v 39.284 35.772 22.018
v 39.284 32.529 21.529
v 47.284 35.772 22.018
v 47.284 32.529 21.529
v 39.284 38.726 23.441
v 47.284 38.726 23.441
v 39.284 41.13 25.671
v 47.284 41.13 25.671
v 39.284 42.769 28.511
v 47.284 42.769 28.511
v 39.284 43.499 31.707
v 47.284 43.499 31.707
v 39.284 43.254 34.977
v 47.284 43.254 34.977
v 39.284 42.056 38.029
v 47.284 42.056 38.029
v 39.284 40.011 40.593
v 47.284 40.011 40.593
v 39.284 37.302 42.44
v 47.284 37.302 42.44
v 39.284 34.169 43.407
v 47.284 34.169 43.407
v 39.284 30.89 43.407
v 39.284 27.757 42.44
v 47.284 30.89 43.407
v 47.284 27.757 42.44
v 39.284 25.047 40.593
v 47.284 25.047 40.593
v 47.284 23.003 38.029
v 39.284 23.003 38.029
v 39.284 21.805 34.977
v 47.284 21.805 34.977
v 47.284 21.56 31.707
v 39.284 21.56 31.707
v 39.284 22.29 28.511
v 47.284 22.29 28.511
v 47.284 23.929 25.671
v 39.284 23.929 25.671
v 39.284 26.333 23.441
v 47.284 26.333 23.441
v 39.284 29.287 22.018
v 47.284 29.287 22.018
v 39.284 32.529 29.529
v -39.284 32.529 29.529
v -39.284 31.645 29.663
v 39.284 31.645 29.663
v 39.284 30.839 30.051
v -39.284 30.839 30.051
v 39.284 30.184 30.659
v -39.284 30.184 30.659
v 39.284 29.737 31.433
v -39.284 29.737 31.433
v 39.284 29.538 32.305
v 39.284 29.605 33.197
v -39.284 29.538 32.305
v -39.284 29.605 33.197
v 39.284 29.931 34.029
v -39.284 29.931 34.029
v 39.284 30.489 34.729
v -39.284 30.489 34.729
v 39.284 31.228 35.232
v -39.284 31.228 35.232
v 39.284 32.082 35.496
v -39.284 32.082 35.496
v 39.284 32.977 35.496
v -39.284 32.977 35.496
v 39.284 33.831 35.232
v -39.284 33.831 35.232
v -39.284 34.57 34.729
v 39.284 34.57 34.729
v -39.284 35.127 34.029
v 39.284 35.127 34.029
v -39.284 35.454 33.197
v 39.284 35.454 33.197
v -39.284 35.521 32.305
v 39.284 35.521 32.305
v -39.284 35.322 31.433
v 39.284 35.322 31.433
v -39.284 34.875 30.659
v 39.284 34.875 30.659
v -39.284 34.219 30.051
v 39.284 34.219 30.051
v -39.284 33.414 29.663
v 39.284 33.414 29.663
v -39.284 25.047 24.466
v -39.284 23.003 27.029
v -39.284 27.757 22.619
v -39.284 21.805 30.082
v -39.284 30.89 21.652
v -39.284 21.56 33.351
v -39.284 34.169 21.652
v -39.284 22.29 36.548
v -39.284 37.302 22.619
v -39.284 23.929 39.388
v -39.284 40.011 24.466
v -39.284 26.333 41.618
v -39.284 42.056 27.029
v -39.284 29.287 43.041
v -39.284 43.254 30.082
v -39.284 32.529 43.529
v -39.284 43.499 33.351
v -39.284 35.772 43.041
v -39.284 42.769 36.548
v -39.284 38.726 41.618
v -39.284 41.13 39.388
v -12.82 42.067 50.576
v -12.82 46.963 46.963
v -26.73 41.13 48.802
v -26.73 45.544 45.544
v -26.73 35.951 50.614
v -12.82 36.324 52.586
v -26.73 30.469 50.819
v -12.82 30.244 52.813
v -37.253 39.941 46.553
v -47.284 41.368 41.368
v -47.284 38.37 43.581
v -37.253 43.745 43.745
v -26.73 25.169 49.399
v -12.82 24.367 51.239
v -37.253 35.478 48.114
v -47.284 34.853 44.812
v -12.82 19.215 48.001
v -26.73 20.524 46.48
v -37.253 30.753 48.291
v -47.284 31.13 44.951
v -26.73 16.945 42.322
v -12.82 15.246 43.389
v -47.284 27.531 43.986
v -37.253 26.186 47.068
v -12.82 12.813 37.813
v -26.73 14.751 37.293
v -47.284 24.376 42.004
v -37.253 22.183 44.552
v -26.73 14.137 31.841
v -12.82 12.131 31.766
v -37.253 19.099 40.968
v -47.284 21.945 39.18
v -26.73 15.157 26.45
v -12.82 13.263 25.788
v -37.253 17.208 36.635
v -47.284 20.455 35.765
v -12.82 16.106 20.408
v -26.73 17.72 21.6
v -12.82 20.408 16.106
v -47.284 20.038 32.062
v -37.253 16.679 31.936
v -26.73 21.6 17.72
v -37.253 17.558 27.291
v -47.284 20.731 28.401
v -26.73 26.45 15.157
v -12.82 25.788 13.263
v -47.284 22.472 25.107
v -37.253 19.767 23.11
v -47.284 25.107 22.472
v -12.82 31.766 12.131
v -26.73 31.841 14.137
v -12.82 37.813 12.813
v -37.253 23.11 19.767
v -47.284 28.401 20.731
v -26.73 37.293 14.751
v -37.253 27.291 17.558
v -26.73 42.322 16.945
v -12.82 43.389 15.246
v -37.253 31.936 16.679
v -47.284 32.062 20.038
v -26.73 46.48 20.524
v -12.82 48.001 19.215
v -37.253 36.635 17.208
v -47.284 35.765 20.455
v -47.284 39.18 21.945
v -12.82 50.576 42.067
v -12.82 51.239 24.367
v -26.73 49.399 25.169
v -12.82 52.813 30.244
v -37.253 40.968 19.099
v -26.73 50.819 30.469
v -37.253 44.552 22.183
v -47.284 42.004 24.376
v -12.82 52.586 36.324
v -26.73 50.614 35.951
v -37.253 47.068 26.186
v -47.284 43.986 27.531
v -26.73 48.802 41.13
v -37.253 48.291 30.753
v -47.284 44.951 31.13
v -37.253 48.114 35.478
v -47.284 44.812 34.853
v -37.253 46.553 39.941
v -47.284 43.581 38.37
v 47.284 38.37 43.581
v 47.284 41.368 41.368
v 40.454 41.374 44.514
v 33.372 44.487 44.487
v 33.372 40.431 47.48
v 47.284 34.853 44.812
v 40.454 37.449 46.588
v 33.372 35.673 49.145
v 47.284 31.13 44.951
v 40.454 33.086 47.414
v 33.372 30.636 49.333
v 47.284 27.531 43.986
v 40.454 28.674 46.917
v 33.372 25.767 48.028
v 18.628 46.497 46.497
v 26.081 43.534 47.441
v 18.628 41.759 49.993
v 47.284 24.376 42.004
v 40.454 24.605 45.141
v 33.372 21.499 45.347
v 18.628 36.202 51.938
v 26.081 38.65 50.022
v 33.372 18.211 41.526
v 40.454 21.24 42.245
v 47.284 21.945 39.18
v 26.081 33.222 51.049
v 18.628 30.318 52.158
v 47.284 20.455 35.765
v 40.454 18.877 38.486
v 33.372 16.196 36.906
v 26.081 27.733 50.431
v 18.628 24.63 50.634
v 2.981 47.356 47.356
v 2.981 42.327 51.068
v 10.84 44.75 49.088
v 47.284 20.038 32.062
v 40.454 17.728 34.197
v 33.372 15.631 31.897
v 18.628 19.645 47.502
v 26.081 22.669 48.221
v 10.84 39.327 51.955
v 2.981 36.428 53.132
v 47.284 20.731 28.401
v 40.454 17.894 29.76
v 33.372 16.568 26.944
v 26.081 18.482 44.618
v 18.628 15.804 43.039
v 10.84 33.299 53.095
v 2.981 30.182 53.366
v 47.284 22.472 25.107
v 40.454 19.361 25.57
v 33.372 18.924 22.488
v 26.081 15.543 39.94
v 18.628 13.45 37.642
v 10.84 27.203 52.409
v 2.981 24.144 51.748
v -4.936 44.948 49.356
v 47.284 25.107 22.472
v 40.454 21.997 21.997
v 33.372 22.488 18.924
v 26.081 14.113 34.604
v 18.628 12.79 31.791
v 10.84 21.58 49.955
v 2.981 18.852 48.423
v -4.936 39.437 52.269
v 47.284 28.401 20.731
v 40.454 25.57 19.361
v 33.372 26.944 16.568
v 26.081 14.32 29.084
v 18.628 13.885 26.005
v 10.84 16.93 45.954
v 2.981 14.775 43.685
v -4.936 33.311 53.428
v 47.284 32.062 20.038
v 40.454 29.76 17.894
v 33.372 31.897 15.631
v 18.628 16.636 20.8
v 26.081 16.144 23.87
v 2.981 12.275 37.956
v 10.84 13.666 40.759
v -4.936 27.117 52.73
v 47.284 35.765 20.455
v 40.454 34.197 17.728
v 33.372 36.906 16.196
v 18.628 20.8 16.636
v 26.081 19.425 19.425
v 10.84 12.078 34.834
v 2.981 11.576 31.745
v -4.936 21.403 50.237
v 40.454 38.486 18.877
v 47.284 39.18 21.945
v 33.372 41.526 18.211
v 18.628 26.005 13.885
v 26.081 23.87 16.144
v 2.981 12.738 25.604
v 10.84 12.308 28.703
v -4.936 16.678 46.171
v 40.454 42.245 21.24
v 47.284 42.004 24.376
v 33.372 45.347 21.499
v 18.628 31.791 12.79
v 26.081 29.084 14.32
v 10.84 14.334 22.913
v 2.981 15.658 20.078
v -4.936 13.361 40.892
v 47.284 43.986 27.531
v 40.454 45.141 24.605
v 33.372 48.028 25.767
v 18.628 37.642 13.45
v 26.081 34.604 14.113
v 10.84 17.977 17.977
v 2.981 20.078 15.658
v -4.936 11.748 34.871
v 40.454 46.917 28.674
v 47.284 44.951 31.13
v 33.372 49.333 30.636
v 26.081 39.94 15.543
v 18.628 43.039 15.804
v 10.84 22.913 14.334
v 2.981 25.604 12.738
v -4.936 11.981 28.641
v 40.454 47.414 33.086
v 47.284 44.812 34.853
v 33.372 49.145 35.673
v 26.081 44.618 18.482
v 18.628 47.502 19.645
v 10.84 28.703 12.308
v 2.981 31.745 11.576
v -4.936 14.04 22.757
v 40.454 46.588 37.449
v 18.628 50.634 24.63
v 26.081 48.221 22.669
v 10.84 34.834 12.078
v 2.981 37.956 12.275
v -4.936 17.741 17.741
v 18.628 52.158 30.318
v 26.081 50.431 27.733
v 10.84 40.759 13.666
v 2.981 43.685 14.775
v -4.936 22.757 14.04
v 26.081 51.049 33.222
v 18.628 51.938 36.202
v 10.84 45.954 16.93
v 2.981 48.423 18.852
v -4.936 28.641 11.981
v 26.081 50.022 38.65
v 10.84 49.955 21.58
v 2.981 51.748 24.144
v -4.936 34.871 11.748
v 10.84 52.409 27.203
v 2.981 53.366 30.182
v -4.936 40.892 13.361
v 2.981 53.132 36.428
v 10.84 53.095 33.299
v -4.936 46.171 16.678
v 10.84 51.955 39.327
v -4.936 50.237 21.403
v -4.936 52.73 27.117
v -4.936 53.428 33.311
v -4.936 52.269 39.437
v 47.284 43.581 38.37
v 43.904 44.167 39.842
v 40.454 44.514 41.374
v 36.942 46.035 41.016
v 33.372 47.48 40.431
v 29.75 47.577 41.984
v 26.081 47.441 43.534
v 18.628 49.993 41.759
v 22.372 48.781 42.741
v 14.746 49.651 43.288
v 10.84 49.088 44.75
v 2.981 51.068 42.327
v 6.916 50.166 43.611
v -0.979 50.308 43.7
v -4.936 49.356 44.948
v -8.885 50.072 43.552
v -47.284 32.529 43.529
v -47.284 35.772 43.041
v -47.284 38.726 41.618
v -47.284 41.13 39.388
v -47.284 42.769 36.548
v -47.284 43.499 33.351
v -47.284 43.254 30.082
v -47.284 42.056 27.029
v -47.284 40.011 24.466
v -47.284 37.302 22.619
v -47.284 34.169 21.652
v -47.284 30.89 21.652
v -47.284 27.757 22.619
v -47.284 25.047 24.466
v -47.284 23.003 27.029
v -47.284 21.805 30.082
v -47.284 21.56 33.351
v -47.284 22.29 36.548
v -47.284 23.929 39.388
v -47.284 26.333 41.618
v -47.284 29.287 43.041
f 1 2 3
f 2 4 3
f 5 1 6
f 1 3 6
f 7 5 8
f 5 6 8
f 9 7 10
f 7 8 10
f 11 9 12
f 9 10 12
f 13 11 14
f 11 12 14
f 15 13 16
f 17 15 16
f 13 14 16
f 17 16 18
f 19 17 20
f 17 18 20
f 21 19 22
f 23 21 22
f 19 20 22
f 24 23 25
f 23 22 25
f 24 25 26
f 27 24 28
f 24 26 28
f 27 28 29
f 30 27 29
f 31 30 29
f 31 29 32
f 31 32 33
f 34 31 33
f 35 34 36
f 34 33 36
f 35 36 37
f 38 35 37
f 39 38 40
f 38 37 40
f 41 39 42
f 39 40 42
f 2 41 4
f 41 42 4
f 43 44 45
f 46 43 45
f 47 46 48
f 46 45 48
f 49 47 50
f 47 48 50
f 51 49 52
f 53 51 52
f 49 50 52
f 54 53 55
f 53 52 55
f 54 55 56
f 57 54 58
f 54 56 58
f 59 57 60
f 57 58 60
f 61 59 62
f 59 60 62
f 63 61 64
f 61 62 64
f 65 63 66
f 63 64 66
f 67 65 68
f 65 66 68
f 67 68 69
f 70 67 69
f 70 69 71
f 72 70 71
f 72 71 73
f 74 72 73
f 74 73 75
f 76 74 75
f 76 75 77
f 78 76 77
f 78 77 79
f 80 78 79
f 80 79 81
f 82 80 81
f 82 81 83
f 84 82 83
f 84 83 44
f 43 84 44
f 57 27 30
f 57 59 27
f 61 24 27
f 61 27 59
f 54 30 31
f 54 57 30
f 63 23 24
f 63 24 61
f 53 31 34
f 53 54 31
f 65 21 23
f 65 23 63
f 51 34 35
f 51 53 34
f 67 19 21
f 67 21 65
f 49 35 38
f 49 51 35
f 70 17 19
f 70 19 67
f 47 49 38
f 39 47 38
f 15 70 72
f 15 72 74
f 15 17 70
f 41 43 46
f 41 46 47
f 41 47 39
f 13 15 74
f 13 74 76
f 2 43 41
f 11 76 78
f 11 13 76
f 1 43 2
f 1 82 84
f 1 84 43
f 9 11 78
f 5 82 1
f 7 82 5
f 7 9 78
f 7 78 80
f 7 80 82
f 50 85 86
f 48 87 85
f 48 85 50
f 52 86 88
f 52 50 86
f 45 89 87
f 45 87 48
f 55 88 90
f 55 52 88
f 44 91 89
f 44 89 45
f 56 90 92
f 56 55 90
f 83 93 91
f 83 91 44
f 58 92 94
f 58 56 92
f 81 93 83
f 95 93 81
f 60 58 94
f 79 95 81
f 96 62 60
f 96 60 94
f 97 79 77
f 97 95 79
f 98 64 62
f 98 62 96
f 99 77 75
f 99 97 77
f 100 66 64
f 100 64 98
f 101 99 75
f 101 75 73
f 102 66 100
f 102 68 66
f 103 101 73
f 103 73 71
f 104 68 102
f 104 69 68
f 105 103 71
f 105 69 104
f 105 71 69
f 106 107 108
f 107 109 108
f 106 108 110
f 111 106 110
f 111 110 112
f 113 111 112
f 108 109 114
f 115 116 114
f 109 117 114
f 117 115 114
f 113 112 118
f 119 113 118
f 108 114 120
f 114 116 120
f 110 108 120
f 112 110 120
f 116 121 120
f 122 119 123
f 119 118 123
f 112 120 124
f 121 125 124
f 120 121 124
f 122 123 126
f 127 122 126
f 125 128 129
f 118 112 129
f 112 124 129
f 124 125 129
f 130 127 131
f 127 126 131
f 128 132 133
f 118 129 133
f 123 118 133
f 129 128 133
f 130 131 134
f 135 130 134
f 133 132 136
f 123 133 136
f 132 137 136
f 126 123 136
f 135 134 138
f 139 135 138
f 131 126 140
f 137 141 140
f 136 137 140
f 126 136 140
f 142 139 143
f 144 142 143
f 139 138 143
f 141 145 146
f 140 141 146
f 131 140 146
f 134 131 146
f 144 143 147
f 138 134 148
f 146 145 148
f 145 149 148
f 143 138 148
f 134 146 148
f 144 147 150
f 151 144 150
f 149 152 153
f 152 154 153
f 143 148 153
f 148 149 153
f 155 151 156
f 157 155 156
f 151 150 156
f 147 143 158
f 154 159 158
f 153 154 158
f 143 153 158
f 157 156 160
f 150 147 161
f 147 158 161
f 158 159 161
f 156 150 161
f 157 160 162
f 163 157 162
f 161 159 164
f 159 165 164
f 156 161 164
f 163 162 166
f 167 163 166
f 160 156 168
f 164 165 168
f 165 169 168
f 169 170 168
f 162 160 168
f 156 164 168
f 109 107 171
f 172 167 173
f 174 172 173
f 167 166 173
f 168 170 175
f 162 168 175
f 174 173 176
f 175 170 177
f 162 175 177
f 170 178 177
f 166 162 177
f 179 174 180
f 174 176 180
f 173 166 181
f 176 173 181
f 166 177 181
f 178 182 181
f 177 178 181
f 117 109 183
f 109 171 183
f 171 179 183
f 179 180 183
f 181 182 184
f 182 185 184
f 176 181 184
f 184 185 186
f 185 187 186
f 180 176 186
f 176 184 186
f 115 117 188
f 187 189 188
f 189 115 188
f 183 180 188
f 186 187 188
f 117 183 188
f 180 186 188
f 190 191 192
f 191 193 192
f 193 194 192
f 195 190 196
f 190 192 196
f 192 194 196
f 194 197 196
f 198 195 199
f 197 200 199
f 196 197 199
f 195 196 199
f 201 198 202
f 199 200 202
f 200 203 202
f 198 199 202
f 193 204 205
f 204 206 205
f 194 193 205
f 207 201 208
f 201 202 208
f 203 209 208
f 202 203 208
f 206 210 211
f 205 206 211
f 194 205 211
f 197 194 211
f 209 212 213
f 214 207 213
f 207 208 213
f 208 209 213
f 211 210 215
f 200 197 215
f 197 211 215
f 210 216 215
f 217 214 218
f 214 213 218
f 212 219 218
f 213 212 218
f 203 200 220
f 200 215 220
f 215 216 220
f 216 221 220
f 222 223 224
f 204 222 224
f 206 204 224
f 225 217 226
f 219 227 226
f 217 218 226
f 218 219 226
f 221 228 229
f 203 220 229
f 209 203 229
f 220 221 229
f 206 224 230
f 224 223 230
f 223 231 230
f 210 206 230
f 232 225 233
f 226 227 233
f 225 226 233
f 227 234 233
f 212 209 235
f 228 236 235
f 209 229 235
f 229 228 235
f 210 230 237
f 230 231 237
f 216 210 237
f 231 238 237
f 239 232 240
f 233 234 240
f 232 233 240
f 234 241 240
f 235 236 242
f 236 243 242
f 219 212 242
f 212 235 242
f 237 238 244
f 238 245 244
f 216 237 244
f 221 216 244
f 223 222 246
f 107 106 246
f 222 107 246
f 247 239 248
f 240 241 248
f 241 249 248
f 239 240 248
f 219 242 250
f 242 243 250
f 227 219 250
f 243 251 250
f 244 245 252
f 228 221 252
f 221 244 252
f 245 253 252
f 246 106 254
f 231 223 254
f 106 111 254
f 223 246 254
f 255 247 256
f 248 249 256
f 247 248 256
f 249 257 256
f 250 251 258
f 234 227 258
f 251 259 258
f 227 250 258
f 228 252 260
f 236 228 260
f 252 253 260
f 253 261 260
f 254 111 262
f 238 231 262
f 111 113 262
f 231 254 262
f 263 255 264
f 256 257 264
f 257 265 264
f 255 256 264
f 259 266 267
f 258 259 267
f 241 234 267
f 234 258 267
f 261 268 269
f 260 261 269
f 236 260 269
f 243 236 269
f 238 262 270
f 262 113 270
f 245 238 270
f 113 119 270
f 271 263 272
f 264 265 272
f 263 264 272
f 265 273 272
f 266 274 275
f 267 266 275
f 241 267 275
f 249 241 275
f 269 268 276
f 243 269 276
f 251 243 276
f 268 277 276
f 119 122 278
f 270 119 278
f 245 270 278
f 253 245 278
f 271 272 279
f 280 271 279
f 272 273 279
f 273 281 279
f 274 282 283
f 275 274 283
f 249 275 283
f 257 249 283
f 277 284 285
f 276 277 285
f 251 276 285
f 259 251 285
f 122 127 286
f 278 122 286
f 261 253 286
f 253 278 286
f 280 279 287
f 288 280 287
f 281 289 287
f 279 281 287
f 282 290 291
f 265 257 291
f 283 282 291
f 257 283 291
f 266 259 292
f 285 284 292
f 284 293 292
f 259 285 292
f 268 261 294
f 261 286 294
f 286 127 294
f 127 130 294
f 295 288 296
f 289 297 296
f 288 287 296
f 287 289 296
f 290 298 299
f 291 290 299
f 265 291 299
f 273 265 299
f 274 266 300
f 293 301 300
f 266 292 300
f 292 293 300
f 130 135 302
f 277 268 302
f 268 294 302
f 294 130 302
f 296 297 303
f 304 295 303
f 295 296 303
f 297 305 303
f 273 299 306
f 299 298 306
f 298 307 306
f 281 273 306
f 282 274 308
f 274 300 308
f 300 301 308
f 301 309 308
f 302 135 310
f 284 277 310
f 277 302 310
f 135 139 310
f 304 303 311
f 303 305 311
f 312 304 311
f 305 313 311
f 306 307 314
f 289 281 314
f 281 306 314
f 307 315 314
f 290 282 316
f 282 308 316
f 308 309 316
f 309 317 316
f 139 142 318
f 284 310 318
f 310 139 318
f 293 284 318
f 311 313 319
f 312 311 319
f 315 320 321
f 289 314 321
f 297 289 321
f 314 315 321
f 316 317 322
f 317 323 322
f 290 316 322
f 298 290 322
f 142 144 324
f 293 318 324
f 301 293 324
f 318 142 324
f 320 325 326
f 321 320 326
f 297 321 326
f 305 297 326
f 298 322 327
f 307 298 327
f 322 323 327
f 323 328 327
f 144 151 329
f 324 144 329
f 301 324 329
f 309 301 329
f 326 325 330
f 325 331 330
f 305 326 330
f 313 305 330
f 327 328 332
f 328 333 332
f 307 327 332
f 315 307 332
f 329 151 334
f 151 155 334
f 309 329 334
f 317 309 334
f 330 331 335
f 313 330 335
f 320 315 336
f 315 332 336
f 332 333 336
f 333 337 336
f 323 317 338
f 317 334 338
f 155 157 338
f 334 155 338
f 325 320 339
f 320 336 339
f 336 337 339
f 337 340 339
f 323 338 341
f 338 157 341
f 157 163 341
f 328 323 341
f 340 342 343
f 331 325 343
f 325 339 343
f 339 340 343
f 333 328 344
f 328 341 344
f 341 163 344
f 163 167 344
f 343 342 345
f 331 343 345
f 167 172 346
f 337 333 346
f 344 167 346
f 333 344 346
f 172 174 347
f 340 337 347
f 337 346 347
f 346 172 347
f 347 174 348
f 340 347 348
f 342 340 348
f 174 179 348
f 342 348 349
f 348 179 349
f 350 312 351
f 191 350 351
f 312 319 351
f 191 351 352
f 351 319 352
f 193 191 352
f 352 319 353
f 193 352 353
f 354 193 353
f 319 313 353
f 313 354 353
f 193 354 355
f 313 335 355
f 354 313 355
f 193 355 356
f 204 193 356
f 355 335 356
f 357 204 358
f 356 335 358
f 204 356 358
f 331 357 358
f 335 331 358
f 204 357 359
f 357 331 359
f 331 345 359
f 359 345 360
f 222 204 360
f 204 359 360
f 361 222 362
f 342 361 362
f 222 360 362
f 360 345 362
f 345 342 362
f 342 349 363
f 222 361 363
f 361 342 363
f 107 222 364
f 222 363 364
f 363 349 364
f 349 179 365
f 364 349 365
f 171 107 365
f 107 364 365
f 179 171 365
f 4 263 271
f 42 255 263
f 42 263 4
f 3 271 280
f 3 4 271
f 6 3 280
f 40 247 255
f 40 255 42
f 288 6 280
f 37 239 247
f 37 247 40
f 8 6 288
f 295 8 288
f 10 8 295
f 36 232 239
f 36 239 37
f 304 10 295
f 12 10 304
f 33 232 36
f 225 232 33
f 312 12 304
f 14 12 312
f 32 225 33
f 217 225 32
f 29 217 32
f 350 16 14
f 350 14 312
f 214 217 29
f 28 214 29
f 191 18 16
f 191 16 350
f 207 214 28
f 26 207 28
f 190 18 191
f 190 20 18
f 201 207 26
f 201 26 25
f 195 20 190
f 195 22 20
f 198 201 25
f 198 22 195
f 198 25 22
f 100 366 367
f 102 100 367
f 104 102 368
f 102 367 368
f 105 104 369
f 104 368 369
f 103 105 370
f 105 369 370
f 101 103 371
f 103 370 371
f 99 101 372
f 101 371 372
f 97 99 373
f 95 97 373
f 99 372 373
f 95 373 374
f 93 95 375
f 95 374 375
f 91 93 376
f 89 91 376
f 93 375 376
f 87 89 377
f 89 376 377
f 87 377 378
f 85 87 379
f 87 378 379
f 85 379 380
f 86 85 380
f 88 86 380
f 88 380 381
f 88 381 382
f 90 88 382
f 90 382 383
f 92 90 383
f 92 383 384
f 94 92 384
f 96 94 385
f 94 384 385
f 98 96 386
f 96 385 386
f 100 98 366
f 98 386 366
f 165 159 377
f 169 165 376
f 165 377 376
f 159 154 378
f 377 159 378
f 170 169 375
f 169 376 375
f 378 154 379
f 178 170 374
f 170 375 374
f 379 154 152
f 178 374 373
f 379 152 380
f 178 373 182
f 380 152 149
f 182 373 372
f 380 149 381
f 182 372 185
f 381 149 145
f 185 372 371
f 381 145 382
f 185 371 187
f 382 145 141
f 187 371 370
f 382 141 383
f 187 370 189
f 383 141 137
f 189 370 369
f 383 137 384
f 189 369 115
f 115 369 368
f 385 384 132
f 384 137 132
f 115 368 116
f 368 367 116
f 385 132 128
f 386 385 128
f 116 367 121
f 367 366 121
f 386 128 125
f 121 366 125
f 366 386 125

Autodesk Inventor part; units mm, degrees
ref_plane "YZ Plane" through (0, 0, 0) normal (1, 0, 0) x (0, 1, 0)
ref_plane "XZ Plane" through (0, 0, 0) normal (0, 1, 0) x (-1, 0, 0)
sketch "Sketch1" plane through (0, 0, 0) normal (0, 0, 1) x (1, 0, 0)
  circle A0 centre (0, 0) radius 100 construction
  circle A1 centre (0, 0) radius 75 construction
  circle A2 centre (0, 75) radius 24 construction
  circle A3 centre (0, 0) radius 89 construction
  dimension "d8" = 150
  dimension "d7" = 200
  dimension "d9" = 48
  dimension "d10" = 14
sketch "Sketch6" plane through (0, 0, 0) normal (0, 0, 1) x (1, 0, 0)
  point P0 (0, 0)
ref_plane "Work Plane3" through (0, 0, 0) normal (0, -0.7071, 0.7071) x (1, 0, 0)
sketch "2d Roller Ellipse" plane through (0, 0, 0) normal (0, -0.7071, 0.7071) x (1, 0, 0)
  ellipse E0 centre (0, 0) end of major axis (100, 0) minor radius 70.7107 construction
  ellipse E1 centre (0, 53.033) end of major axis (24, 53.033) minor radius 16.9706 construction
  ellipse E2 centre (0, 0) end of major axis (100, 0) minor radius 70.7107 construction
  ellipse E3 centre (0, 0) end of major axis (-100, 0) minor radius 70.0036 construction
  line L0 (0, 70.0036) -> (0, 67.0036) construction
  line L1 (0, 67.0036) -> (0, 46.0036) construction
  circle A0 centre (0, 46.0036) radius 21 construction
  ellipse E4 centre (0, 0) end of major axis (-97, 0) minor radius 67.0036 (47.2844, 58.5036) -> (-47.2844, 58.5036) ccw
  line L2 (0, 46.0036) -> (0, 58.5036) construction
  line L3 (0, 58.5036) -> (51.8941, 58.5036) construction
  line L4 (47.2844, 58.5036) -> (47.2844, 46.0036)
  line L5 (47.2844, 46.0036) -> (0, 46.0036)
  line L6 (-47.2844, 58.5036) -> (-47.2844, 46.0036)
  line L7 (-47.2844, 46.0036) -> (0, 46.0036)
  dimension "d53" = 25
  dimension "d61" = 100
  dimension "d63" = 70.7107
  dimension "d77" = 3
  dimension "d78" = 21
  dimension "d79" = 42
  dimension "d80" = 12.5
  dimension "d81" = 12.5
  dimension "d82" = 4.6098
revolve "Revolution4" add sketch "2d Roller Ellipse" angle 360 about axis through (-47.2844, 32.5294, 32.5294) along (1, 0, 0)
sketch "Sketch11" plane through (47.2844, 32.5294, 32.5294) normal (1, 0, 0) x (0, 0, -1)
  circle A0 centre (0, 0) radius 12.5 projected
  point P0 (32.5294, -32.5294)
  point P1 (-8.8388, 8.8388)
hole "Hole1" at (47.2844, 32.5294, 32.5294) direction (-1, 0, 0) diameter 6 end through all
sketch "Sketch12" plane through (47.2844, 32.5294, 32.5294) normal (1, 0, 0) x (0, 0, -1)
  circle A0 centre (0, 0) radius 11
  circle A1 centre (0, 0) radius 12.5 projected
  point P0 (32.5294, -32.5294)
  point P1 (-8.8388, 8.8388)
  dimension "d93" = 22
extrude "Extrusion5" cut sketch "Sketch12" against normal blind 8 contours A0
sketch "Sketch13" plane through (-47.2844, 32.5294, 32.5294) normal (-1, 0, 0) x (0, 0, 1)
  circle A0 centre (0, 0) radius 12.5 projected
  circle A1 centre (0, 0) radius 3 projected
  circle A2 centre (0, 0) radius 11
  point P0 (-32.5294, -32.5294)
  point P1 (8.8388, 8.8388)
  dimension "d96" = 22
extrude "Extrusion6" cut sketch "Sketch13" against normal blind 8 contours A2
properties part number "Mecanum_Roller_48mm"
